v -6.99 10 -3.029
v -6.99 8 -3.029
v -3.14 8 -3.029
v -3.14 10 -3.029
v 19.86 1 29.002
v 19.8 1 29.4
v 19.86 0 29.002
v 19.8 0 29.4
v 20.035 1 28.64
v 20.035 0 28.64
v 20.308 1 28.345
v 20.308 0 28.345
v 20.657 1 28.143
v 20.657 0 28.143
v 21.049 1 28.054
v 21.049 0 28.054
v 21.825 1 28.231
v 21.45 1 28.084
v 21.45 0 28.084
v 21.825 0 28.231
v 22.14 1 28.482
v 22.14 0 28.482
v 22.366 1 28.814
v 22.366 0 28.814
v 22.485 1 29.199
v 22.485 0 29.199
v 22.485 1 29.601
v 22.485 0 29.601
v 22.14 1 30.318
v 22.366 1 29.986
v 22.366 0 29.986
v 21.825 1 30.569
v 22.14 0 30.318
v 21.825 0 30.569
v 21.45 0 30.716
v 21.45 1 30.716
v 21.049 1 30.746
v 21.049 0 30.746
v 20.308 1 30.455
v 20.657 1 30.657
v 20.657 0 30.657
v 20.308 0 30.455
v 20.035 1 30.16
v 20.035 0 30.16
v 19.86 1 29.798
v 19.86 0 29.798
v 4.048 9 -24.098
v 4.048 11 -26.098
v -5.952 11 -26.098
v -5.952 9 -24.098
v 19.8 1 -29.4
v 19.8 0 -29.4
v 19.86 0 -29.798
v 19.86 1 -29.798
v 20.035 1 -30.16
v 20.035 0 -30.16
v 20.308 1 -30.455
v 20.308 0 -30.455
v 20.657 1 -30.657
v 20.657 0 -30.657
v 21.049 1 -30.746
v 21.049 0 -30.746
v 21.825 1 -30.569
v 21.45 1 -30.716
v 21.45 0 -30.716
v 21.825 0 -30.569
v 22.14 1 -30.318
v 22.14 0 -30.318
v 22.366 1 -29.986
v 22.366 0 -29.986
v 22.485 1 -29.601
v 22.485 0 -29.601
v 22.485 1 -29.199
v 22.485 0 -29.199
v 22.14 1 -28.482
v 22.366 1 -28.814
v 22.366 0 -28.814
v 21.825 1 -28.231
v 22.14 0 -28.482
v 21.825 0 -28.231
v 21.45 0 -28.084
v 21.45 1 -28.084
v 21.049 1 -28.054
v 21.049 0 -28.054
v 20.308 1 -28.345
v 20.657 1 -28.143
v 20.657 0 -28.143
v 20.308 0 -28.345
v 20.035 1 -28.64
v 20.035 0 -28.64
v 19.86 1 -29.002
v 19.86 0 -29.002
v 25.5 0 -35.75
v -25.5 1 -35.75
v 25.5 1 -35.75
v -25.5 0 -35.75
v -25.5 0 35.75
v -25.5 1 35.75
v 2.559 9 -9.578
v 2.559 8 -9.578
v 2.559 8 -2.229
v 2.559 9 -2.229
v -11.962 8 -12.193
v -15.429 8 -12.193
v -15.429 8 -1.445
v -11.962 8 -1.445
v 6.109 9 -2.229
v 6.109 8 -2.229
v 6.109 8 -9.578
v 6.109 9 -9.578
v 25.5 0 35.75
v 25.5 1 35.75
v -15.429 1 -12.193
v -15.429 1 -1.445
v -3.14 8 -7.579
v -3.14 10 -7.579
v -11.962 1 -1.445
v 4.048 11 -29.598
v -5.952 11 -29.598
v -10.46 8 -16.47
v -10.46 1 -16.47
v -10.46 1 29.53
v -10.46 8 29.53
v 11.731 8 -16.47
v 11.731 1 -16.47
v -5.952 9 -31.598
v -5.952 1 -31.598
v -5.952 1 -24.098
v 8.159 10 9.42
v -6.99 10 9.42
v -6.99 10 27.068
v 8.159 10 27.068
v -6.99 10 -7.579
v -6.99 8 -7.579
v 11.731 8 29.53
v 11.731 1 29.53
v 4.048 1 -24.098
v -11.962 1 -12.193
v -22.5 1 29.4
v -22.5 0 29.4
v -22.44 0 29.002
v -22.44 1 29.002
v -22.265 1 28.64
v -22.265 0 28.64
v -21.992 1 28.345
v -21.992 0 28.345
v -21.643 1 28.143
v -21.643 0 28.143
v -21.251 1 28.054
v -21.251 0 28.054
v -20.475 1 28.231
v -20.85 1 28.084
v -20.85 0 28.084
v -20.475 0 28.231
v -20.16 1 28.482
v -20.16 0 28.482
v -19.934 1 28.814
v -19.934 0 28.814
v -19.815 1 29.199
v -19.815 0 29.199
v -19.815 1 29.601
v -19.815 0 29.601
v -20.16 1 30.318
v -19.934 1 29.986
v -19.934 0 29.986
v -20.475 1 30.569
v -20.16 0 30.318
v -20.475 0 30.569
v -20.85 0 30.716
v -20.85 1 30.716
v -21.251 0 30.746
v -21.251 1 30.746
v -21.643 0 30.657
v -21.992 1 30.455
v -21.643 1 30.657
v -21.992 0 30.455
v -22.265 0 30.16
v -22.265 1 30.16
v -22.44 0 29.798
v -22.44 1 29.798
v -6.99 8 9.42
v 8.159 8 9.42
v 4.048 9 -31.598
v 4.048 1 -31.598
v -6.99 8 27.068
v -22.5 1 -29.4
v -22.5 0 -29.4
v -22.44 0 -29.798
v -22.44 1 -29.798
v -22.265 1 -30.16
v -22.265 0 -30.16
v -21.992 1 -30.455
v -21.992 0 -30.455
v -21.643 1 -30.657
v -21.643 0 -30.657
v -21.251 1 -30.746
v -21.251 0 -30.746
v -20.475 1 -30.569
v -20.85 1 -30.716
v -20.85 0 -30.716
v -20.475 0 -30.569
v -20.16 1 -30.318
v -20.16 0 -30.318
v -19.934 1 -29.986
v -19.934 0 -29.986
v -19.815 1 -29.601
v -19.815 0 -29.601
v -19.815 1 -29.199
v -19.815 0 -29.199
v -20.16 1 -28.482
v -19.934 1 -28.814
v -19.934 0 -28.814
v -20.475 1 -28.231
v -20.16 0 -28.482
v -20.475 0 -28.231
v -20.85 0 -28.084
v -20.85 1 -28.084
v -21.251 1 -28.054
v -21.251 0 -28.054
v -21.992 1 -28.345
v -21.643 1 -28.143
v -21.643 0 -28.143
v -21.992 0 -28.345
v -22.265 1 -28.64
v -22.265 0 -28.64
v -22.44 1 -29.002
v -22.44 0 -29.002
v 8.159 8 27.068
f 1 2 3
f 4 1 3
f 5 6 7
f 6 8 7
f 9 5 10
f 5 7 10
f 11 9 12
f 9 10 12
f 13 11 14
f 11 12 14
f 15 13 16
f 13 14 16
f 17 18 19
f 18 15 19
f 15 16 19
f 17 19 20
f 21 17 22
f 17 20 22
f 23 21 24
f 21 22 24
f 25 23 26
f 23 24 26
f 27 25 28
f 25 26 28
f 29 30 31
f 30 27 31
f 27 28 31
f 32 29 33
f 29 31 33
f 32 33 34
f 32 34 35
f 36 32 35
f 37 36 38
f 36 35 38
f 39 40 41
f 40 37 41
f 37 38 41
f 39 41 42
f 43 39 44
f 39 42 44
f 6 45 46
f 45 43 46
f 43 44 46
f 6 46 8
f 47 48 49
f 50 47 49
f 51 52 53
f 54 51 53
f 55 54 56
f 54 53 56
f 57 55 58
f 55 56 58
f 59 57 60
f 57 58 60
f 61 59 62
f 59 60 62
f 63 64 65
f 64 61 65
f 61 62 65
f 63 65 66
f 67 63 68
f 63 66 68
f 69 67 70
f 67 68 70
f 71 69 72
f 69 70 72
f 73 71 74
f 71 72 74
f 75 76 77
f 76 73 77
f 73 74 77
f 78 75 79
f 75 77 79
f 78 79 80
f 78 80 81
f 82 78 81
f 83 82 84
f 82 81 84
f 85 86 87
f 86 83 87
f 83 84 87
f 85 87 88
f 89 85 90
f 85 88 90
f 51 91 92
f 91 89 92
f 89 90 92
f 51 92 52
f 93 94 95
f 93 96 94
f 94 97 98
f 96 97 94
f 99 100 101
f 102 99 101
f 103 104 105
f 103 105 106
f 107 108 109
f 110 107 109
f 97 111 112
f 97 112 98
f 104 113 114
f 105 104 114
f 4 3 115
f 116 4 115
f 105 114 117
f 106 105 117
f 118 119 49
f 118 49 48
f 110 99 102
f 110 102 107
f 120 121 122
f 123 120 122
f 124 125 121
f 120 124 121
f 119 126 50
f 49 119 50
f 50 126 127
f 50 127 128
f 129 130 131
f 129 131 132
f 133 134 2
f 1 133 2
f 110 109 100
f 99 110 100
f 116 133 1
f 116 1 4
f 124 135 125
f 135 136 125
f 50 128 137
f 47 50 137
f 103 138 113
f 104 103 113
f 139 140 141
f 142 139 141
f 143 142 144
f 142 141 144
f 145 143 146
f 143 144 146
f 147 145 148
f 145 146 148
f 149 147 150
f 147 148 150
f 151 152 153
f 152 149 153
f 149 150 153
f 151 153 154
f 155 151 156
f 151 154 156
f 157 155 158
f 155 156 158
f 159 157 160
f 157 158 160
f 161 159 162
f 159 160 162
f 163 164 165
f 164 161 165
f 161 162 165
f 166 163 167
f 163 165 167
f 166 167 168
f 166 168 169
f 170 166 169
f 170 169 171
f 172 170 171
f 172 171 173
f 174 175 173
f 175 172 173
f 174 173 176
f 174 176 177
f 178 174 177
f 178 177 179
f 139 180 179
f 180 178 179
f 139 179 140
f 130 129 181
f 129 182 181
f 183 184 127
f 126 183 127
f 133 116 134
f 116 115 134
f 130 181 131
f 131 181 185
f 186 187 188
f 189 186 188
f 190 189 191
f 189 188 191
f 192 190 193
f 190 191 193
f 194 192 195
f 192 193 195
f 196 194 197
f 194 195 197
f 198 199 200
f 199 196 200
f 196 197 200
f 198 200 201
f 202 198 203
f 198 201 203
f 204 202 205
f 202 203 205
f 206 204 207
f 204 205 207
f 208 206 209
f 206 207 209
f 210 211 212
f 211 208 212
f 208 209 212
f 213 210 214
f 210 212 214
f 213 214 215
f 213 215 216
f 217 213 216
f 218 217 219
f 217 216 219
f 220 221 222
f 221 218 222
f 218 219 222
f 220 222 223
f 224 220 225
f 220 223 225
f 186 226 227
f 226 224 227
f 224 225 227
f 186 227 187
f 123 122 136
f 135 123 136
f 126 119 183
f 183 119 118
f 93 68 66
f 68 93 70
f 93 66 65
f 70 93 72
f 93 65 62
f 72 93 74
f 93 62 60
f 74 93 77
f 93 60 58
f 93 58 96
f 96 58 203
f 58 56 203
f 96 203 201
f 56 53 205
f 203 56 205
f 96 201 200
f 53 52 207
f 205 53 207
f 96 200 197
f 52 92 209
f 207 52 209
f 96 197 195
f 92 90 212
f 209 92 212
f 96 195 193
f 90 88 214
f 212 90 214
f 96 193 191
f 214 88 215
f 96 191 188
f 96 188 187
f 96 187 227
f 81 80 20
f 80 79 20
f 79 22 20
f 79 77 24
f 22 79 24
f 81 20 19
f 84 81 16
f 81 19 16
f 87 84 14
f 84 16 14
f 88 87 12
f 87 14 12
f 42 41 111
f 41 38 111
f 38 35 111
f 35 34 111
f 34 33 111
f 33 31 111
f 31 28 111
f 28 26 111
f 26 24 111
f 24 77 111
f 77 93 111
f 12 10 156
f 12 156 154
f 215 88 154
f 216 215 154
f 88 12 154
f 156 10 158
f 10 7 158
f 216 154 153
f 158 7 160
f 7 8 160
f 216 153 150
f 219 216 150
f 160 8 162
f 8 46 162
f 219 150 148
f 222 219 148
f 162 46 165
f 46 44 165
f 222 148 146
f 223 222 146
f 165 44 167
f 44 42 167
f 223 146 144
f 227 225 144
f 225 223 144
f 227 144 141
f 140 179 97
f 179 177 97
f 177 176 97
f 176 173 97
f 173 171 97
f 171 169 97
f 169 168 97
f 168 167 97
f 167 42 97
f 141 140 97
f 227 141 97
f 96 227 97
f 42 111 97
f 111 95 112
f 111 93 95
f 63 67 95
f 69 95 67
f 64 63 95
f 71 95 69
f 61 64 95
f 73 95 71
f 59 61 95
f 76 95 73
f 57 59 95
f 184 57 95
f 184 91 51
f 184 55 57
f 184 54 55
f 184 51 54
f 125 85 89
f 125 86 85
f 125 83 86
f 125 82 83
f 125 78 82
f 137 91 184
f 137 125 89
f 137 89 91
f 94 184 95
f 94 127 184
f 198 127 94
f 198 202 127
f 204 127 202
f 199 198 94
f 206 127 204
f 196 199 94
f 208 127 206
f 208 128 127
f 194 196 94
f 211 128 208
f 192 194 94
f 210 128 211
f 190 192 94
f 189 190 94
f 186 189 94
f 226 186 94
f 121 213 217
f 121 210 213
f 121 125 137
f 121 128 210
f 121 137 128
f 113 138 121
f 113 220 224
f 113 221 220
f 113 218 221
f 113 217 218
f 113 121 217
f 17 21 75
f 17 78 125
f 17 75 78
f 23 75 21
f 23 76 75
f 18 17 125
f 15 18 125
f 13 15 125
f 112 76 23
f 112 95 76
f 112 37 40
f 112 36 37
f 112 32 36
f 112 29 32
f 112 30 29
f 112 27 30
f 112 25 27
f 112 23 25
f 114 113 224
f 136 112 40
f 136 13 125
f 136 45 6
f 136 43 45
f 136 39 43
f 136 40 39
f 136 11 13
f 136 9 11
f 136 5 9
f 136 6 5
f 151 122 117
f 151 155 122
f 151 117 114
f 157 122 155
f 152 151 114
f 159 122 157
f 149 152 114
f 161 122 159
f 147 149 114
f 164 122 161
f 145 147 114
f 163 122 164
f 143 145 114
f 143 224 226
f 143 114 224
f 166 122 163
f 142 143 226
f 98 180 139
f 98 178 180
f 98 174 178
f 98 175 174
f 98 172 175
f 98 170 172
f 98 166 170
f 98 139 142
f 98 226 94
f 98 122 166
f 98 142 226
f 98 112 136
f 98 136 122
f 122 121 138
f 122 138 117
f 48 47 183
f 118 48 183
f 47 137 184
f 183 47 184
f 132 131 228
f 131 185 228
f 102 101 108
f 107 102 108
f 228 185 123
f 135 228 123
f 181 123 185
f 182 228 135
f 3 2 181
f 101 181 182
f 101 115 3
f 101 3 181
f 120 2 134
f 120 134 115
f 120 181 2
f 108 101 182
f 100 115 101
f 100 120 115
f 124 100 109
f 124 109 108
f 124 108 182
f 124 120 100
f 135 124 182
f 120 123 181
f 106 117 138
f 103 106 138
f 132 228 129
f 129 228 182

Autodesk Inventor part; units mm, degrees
ref_plane "YZ Plane" through (0, 0, 0) normal (1, 0, 0) x (0, 1, 0)
ref_plane "XZ Plane" through (0, 0, 0) normal (0, 1, 0) x (-1, 0, 0)
ref_plane "XY Plane" through (0, 0, 0) normal (0, 0, 1) x (1, 0, 0)
sketch "Esboço1" plane through (0, 0, 0) normal (0, 1, 0) x (-1, 0, 0)
  line L0 (-25.5, 35.75) -> (25.5, 35.75)
  line L1 (25.5, 35.75) -> (25.5, -35.75)
  line L2 (25.5, -35.75) -> (-25.5, -35.75)
  line L3 (-25.5, -35.75) -> (-25.5, 35.75)
  line L4 (-25.5, 35.75) -> (25.5, -35.75) construction
  line L5 (25.5, 35.75) -> (-25.5, -35.75) construction
  circle A0 centre (21.15, 29.4) radius 1.35
  circle A1 centre (-21.15, 29.4) radius 1.35
  line L6 (35.4001, 0) -> (-36.6047, 0)
  circle A2 centre (21.15, -29.4) radius 1.35
  circle A3 centre (-21.15, -29.4) radius 1.35
  point P0 (0, 0)
  dimension "d0" = 51
  dimension "d1" = 71.5
  dimension "d2" = 2.7
  dimension "d3" = 3
  dimension "d4" = 5
  dimension "d5" = 2.7
  dimension "d6" = 5
  dimension "d7" = 3
extrude "Extrusão1" add sketch "Esboço1" along normal blind 1
sketch "Esboço2" plane through (0, 1, 0) normal (0, 1, 0) x (1, 0, 0)
  line L0 (-25.5, 35.75) -> (-25.5, -35.75) projected
  line L1 (-25.5, -35.75) -> (25.5, -35.75) projected
  line L2 (25.5, 35.75) -> (-25.5, 35.75) projected
  line L3 (25.5, -35.75) -> (25.5, 35.75) projected
  line L4 (-10.4597, -29.5298) -> (11.731, -29.5298)
  line L5 (11.731, -29.5298) -> (11.731, 16.4696)
  line L6 (11.731, 16.4696) -> (-10.4597, 16.4696)
  line L7 (-10.4597, 16.4696) -> (-10.4597, -29.5298)
  line L8 (-15.4294, 1.4447) -> (-11.9622, 1.4447)
  line L9 (-11.9622, 1.4447) -> (-11.9622, 12.1933)
  line L10 (-11.9622, 12.1933) -> (-15.4294, 12.1933)
  line L11 (-15.4294, 12.1933) -> (-15.4294, 1.4447)
  line L12 (-5.9522, 24.0977) -> (4.0478, 24.0977)
  line L13 (4.0478, 24.0977) -> (4.0478, 31.5977)
  line L14 (4.0478, 31.5977) -> (-5.9522, 31.5977)
  line L15 (-5.9522, 31.5977) -> (-5.9522, 24.0977)
  point P0 (0, 0)
  dimension "d12" = 10
  dimension "d13" = 7.5
extrude "Extrusão2" add sketch "Esboço2" along normal blind 7 contours L7 L6 L5 L4 | L11 L10 L9 L8
extrude "Extrusão3" add sketch "Esboço2" along normal blind 10 contours L15 L14 L13 L12
chamfer "Chanfro1" distance 2 angle 45 2 edges at (-0.9522, 11, -24.0977) (-0.9522, 11, -31.5977)
sketch "Esboço3" plane through (0, 8, 0) normal (0, 1, 0) x (1, 0, 0)
  line L0 (-10.4597, 16.4696) -> (-10.4597, -29.5298) projected
  line L1 (-10.4597, -29.5298) -> (11.731, -29.5298) projected
  line L2 (11.731, 16.4696) -> (-10.4597, 16.4696) projected
  line L3 (11.731, -29.5298) -> (11.731, 16.4696) projected
  line L4 (-6.9899, -27.068) -> (8.1586, -27.068)
  line L5 (8.1586, -27.068) -> (8.1586, -9.4197)
  line L6 (8.1586, -9.4197) -> (-6.9899, -9.4197)
  line L7 (-6.9899, -9.4197) -> (-6.9899, -27.068)
  line L8 (-6.9899, 3.0291) -> (-3.1403, 3.0291)
  line L9 (-3.1403, 3.0291) -> (-3.1403, 7.5786)
  line L10 (-3.1403, 7.5786) -> (-6.9899, 7.5786)
  line L11 (-6.9899, 7.5786) -> (-6.9899, 3.0291)
  line L12 (2.5592, 2.2291) -> (6.1088, 2.2291)
  line L13 (6.1088, 2.2291) -> (6.1088, 9.5784)
  line L14 (6.1088, 9.5784) -> (2.5592, 9.5784)
  line L15 (2.5592, 9.5784) -> (2.5592, 2.2291)
  point P0 (0, 0)
extrude "Extrusão4" add sketch "Esboço3" along normal blind 2 contours L7 L6 L5 L4 | L11 L10 L9 L8
extrude "Extrusão5" add sketch "Esboço3" along normal blind 1 contours L15 L14 L13 L12
properties part number "PCB"
